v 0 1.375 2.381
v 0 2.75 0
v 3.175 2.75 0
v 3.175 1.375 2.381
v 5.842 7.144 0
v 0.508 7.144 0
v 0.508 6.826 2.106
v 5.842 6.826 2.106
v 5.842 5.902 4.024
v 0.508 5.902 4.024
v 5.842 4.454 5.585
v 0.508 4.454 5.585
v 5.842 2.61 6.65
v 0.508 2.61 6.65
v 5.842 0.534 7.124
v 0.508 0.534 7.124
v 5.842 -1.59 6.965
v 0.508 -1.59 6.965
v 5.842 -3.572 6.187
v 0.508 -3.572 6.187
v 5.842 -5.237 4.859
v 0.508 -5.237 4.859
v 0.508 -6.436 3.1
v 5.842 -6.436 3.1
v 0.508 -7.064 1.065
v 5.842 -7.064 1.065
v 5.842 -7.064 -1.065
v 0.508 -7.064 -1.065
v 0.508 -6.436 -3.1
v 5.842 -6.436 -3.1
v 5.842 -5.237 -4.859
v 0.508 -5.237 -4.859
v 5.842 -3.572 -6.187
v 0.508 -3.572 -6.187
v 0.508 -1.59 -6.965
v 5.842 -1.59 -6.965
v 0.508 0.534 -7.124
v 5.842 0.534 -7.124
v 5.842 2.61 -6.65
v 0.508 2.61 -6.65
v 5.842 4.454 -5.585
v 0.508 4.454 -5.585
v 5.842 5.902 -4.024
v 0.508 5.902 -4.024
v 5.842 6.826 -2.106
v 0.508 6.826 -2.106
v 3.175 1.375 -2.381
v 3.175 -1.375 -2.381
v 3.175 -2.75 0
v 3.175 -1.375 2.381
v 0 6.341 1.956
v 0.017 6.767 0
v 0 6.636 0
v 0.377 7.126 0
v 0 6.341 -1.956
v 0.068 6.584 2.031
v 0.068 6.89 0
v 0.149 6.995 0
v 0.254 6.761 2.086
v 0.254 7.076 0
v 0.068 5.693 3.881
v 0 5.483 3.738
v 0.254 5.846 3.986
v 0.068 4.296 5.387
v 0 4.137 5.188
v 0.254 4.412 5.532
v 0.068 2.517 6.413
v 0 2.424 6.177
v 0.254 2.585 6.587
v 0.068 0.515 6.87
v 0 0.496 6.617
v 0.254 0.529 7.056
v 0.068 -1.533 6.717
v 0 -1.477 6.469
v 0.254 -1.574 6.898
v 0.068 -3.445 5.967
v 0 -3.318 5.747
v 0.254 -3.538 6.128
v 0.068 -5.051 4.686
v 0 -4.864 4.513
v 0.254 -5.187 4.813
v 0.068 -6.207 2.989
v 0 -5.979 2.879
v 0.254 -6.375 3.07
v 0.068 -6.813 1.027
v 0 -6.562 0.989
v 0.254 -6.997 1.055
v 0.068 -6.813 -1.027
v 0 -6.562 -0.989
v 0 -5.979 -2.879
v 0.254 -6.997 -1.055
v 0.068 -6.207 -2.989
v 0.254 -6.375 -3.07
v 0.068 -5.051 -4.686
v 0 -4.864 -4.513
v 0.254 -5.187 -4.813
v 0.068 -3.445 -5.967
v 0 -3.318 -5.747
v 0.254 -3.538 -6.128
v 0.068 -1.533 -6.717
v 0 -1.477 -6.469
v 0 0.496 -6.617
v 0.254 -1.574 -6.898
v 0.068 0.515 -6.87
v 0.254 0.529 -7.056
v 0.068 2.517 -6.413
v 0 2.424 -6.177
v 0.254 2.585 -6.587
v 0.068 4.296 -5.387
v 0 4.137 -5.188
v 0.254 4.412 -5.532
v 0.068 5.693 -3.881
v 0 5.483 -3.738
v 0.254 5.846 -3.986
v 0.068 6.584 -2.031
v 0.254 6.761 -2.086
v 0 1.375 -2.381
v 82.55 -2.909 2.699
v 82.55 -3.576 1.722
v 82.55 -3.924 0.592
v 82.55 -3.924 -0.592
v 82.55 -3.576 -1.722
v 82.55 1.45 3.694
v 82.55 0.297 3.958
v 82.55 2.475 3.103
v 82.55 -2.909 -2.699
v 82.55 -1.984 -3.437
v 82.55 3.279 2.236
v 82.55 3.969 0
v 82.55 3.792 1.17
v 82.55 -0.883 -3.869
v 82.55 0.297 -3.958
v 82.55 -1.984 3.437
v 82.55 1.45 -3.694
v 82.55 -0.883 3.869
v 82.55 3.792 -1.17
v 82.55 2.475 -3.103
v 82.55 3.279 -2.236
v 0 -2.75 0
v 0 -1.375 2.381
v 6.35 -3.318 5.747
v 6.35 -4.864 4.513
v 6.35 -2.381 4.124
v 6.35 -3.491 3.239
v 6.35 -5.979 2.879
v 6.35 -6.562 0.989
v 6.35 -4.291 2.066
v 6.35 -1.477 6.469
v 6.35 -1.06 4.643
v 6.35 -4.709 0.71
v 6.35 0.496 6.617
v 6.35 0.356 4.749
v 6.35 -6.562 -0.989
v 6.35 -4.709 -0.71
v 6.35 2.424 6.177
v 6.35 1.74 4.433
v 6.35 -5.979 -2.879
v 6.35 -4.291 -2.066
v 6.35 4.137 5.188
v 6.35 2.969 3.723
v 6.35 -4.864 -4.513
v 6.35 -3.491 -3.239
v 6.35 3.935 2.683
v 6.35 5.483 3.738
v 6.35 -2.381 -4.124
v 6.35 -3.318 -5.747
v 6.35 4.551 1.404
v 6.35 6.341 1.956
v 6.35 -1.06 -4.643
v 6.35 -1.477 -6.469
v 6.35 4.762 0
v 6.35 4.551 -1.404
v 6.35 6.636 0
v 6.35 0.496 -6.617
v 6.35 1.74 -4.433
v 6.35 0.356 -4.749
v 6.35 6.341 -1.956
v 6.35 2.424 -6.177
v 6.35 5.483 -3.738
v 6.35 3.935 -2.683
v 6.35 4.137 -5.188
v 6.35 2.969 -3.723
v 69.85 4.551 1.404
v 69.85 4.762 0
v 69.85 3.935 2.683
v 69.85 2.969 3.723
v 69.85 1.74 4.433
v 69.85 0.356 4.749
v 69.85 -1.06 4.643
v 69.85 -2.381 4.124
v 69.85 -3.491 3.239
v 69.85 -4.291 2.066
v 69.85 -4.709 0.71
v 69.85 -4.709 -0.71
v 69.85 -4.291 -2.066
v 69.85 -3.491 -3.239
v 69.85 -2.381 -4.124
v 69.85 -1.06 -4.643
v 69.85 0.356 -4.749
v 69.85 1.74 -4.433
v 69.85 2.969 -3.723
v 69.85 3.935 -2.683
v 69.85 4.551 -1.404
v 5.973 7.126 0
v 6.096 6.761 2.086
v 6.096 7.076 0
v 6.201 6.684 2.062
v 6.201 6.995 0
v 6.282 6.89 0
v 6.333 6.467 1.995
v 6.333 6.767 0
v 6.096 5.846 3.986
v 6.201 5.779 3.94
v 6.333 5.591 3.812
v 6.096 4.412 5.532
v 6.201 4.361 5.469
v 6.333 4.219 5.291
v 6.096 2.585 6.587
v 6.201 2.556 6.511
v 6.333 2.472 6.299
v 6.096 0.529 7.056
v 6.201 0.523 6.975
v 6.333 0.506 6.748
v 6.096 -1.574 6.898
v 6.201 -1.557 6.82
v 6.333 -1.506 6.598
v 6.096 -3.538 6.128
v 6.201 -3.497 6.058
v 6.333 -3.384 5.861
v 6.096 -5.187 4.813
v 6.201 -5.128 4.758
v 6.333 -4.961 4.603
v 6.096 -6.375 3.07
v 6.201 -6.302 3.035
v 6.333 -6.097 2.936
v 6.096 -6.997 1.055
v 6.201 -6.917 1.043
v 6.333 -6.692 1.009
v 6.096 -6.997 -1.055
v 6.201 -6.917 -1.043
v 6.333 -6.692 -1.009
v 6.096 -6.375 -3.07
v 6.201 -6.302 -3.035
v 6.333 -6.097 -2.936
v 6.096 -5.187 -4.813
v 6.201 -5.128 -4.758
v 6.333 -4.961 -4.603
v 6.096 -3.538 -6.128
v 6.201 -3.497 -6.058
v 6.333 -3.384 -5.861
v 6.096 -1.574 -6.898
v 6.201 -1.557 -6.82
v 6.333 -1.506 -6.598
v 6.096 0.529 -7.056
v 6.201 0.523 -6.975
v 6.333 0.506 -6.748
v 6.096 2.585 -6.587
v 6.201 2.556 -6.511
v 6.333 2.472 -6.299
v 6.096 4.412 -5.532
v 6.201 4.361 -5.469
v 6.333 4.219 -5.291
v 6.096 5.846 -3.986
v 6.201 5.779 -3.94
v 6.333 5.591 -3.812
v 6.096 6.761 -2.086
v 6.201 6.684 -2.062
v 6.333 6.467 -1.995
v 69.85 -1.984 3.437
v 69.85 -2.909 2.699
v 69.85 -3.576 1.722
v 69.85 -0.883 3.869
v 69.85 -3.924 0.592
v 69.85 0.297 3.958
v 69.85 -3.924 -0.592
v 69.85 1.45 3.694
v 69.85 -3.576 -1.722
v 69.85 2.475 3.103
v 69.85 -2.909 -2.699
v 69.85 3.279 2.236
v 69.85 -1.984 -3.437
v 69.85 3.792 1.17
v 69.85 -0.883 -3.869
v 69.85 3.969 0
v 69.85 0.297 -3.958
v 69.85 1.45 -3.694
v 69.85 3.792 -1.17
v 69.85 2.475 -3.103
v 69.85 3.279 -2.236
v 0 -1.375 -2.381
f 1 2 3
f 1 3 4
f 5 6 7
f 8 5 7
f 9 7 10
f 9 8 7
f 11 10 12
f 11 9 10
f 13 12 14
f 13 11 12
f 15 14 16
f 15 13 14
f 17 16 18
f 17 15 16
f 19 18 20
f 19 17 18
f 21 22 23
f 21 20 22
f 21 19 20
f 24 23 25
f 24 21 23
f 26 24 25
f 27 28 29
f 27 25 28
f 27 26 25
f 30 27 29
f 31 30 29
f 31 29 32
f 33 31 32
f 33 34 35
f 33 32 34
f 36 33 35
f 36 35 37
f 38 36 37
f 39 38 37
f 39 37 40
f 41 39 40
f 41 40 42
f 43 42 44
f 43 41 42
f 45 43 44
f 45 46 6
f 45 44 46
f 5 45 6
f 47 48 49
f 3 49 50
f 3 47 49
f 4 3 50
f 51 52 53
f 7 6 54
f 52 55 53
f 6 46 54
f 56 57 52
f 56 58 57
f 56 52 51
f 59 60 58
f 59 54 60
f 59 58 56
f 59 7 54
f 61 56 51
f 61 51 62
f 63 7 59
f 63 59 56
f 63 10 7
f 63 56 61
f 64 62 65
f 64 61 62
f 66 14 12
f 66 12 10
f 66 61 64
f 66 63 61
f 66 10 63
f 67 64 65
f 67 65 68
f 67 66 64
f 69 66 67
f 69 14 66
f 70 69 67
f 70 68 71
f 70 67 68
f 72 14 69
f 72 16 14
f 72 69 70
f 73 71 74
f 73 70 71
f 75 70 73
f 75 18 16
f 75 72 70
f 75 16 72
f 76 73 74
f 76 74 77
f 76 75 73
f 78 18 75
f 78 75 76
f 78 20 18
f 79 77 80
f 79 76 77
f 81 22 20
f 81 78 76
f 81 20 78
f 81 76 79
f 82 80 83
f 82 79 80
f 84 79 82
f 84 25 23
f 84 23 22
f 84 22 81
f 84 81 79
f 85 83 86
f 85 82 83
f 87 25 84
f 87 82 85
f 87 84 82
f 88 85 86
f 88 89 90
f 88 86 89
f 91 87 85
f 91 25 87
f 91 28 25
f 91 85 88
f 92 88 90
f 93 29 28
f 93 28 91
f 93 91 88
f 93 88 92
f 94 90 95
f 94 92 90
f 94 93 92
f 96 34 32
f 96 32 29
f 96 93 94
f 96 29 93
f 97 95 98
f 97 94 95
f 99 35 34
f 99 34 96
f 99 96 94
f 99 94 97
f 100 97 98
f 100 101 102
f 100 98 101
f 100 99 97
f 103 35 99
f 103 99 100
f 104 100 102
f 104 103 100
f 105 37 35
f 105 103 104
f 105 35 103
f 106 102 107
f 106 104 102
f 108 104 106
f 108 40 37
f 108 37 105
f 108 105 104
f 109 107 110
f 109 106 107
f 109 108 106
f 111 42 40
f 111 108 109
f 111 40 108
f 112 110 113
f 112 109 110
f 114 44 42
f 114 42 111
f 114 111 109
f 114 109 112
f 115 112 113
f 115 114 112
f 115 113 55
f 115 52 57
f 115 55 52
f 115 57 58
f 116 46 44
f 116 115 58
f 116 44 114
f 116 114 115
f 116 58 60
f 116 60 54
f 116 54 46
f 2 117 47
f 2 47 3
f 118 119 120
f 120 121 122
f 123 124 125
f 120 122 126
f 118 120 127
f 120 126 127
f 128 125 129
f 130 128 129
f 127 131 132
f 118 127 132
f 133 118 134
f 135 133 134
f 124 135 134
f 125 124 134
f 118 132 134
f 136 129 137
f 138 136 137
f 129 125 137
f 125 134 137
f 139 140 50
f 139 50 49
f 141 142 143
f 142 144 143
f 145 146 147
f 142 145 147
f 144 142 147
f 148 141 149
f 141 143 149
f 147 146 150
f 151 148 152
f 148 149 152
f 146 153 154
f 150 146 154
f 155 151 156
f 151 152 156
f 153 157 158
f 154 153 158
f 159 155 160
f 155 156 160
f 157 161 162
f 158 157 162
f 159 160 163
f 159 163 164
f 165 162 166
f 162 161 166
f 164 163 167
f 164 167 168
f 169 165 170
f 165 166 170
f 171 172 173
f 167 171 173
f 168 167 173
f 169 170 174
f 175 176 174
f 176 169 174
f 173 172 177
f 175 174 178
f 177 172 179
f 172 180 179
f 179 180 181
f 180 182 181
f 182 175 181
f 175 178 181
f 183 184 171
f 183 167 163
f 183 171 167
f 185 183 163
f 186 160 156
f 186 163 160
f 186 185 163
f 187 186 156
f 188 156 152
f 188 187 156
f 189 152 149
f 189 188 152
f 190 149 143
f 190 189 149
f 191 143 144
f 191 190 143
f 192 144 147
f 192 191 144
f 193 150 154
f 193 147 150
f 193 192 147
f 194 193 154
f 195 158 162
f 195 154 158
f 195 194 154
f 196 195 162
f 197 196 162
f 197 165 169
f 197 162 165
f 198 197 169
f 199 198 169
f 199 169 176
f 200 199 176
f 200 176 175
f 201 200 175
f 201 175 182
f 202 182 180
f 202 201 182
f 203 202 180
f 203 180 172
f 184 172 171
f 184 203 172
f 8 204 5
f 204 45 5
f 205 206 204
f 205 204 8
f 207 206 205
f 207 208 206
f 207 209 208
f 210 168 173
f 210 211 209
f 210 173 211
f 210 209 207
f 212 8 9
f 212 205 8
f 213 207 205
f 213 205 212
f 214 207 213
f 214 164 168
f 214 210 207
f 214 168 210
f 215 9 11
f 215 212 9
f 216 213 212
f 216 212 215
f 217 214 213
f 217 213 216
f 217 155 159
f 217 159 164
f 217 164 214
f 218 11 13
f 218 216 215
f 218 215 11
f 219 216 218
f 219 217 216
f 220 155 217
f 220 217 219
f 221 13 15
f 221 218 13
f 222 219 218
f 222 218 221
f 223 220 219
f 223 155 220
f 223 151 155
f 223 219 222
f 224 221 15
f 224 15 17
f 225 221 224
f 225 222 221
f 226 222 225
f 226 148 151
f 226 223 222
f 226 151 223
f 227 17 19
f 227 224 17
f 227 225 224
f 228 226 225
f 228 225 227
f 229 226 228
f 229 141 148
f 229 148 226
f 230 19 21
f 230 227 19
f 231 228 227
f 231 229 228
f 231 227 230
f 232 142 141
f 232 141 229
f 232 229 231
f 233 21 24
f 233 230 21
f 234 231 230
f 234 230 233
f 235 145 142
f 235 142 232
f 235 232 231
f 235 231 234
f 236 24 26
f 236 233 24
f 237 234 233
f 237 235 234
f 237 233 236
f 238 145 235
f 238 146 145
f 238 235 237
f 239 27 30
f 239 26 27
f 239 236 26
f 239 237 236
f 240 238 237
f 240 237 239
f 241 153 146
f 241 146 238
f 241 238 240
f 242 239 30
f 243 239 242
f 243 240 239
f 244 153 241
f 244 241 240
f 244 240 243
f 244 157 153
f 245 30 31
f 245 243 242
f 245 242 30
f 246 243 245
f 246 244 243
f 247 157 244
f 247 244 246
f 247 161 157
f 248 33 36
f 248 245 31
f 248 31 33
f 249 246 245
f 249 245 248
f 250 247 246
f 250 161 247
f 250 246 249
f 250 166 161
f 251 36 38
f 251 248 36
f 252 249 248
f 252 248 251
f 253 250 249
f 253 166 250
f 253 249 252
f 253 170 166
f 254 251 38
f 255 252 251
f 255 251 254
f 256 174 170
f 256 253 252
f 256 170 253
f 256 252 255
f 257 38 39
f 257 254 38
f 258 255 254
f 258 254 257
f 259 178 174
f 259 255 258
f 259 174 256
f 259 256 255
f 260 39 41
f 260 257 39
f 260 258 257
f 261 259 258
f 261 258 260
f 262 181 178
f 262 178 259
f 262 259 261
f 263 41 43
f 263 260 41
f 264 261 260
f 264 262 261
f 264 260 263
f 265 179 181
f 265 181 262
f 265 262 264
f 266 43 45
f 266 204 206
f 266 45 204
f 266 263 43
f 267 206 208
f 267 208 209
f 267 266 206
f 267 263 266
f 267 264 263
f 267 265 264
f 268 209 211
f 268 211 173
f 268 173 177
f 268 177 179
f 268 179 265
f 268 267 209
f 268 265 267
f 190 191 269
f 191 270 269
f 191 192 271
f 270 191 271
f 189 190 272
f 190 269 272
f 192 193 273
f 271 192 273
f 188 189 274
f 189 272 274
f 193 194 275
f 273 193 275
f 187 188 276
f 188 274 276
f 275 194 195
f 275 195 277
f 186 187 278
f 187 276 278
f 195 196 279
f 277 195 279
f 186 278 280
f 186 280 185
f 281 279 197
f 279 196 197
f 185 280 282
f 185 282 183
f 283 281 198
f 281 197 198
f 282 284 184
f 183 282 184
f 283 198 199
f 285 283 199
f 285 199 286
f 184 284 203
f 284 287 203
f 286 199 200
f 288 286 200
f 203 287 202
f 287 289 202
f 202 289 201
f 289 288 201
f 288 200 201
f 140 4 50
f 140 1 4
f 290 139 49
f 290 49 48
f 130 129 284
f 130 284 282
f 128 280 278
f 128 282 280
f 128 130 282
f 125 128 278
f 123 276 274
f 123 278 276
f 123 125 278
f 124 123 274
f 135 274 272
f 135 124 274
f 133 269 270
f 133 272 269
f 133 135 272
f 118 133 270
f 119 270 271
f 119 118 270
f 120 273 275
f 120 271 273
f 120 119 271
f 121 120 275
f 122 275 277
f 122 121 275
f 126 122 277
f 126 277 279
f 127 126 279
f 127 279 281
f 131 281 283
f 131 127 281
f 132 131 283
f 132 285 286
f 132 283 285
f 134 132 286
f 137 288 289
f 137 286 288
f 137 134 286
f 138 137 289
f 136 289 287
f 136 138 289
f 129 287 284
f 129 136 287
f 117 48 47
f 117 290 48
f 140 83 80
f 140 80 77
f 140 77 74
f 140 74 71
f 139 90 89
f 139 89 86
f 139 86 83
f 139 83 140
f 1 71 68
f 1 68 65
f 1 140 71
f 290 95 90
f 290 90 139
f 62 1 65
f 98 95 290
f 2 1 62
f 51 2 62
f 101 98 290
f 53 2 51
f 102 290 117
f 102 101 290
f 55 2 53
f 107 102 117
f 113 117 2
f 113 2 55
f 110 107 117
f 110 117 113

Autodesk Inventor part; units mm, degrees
ref_plane "YZ Plane" through (0, 0, 0) normal (1, 0, 0) x (0, 1, 0)
ref_plane "XZ Plane" through (0, 0, 0) normal (0, 1, 0) x (-1, 0, 0)
ref_plane "XY Plane" through (0, 0, 0) normal (0, 0, 1) x (1, 0, 0)
sketch "Sketch1" plane through (0, 0, 0) normal (0, 0, 1) x (1, 0, 0)
  line L0 (0, 0) -> (0, 7.1437)
  line L1 (0, 7.1437) -> (6.35, 7.1438)
  line L2 (6.35, 7.1438) -> (6.35, 4.7625)
  line L3 (6.35, 4.7625) -> (69.85, 4.7625)
  line L4 (69.85, 4.7625) -> (69.85, 3.9688)
  line L5 (69.85, 3.9688) -> (82.55, 3.9688)
  line L6 (82.55, 3.9688) -> (82.55, 0)
  line L7 (82.55, 0) -> (0, 0)
  dimension "d0" = 7.1437
  dimension "d1" = 4.7625
  dimension "d2" = 3.9688
  dimension "d3" = 6.35
  dimension "d4" = 63.5
  dimension "d5" = 12.7
revolve "Revolution1" add sketch "Sketch1" angle 360 about axis through (82.55, 0, 0) along (-1, 0, 0)
fillet "Fillet1" radius 0.508 2 edges at (0, -7.1437, 0) (6.35, -7.1437, 0)
thread "Thread1" size "5/16-18 UNC" class "2A" standard "ANSI Unified Screw Threads" full length
sketch "Sketch2" plane through (0, 0, 0) normal (-1, 0, 0) x (0, 0, 1)
  circle A0 centre (0, 0) radius 6.6357 projected
  line L0 (0, 2.7496) -> (2.3812, 1.3748)
  line L1 (2.3812, 1.3748) -> (2.3812, -1.3748)
  line L2 (2.3812, -1.3748) -> (0, -2.7496)
  line L3 (0, -2.7496) -> (-2.3813, -1.3748)
  line L4 (-2.3813, -1.3748) -> (-2.3813, 1.3748)
  line L5 (-2.3813, 1.3748) -> (0, 2.7496)
  dimension "d10" = 4.7625
extrude "Extrusion1" cut sketch "Sketch2" against normal blind 3.175 contours L0 L1 L2 L3 L4 L5
properties part number "HW-00065"
